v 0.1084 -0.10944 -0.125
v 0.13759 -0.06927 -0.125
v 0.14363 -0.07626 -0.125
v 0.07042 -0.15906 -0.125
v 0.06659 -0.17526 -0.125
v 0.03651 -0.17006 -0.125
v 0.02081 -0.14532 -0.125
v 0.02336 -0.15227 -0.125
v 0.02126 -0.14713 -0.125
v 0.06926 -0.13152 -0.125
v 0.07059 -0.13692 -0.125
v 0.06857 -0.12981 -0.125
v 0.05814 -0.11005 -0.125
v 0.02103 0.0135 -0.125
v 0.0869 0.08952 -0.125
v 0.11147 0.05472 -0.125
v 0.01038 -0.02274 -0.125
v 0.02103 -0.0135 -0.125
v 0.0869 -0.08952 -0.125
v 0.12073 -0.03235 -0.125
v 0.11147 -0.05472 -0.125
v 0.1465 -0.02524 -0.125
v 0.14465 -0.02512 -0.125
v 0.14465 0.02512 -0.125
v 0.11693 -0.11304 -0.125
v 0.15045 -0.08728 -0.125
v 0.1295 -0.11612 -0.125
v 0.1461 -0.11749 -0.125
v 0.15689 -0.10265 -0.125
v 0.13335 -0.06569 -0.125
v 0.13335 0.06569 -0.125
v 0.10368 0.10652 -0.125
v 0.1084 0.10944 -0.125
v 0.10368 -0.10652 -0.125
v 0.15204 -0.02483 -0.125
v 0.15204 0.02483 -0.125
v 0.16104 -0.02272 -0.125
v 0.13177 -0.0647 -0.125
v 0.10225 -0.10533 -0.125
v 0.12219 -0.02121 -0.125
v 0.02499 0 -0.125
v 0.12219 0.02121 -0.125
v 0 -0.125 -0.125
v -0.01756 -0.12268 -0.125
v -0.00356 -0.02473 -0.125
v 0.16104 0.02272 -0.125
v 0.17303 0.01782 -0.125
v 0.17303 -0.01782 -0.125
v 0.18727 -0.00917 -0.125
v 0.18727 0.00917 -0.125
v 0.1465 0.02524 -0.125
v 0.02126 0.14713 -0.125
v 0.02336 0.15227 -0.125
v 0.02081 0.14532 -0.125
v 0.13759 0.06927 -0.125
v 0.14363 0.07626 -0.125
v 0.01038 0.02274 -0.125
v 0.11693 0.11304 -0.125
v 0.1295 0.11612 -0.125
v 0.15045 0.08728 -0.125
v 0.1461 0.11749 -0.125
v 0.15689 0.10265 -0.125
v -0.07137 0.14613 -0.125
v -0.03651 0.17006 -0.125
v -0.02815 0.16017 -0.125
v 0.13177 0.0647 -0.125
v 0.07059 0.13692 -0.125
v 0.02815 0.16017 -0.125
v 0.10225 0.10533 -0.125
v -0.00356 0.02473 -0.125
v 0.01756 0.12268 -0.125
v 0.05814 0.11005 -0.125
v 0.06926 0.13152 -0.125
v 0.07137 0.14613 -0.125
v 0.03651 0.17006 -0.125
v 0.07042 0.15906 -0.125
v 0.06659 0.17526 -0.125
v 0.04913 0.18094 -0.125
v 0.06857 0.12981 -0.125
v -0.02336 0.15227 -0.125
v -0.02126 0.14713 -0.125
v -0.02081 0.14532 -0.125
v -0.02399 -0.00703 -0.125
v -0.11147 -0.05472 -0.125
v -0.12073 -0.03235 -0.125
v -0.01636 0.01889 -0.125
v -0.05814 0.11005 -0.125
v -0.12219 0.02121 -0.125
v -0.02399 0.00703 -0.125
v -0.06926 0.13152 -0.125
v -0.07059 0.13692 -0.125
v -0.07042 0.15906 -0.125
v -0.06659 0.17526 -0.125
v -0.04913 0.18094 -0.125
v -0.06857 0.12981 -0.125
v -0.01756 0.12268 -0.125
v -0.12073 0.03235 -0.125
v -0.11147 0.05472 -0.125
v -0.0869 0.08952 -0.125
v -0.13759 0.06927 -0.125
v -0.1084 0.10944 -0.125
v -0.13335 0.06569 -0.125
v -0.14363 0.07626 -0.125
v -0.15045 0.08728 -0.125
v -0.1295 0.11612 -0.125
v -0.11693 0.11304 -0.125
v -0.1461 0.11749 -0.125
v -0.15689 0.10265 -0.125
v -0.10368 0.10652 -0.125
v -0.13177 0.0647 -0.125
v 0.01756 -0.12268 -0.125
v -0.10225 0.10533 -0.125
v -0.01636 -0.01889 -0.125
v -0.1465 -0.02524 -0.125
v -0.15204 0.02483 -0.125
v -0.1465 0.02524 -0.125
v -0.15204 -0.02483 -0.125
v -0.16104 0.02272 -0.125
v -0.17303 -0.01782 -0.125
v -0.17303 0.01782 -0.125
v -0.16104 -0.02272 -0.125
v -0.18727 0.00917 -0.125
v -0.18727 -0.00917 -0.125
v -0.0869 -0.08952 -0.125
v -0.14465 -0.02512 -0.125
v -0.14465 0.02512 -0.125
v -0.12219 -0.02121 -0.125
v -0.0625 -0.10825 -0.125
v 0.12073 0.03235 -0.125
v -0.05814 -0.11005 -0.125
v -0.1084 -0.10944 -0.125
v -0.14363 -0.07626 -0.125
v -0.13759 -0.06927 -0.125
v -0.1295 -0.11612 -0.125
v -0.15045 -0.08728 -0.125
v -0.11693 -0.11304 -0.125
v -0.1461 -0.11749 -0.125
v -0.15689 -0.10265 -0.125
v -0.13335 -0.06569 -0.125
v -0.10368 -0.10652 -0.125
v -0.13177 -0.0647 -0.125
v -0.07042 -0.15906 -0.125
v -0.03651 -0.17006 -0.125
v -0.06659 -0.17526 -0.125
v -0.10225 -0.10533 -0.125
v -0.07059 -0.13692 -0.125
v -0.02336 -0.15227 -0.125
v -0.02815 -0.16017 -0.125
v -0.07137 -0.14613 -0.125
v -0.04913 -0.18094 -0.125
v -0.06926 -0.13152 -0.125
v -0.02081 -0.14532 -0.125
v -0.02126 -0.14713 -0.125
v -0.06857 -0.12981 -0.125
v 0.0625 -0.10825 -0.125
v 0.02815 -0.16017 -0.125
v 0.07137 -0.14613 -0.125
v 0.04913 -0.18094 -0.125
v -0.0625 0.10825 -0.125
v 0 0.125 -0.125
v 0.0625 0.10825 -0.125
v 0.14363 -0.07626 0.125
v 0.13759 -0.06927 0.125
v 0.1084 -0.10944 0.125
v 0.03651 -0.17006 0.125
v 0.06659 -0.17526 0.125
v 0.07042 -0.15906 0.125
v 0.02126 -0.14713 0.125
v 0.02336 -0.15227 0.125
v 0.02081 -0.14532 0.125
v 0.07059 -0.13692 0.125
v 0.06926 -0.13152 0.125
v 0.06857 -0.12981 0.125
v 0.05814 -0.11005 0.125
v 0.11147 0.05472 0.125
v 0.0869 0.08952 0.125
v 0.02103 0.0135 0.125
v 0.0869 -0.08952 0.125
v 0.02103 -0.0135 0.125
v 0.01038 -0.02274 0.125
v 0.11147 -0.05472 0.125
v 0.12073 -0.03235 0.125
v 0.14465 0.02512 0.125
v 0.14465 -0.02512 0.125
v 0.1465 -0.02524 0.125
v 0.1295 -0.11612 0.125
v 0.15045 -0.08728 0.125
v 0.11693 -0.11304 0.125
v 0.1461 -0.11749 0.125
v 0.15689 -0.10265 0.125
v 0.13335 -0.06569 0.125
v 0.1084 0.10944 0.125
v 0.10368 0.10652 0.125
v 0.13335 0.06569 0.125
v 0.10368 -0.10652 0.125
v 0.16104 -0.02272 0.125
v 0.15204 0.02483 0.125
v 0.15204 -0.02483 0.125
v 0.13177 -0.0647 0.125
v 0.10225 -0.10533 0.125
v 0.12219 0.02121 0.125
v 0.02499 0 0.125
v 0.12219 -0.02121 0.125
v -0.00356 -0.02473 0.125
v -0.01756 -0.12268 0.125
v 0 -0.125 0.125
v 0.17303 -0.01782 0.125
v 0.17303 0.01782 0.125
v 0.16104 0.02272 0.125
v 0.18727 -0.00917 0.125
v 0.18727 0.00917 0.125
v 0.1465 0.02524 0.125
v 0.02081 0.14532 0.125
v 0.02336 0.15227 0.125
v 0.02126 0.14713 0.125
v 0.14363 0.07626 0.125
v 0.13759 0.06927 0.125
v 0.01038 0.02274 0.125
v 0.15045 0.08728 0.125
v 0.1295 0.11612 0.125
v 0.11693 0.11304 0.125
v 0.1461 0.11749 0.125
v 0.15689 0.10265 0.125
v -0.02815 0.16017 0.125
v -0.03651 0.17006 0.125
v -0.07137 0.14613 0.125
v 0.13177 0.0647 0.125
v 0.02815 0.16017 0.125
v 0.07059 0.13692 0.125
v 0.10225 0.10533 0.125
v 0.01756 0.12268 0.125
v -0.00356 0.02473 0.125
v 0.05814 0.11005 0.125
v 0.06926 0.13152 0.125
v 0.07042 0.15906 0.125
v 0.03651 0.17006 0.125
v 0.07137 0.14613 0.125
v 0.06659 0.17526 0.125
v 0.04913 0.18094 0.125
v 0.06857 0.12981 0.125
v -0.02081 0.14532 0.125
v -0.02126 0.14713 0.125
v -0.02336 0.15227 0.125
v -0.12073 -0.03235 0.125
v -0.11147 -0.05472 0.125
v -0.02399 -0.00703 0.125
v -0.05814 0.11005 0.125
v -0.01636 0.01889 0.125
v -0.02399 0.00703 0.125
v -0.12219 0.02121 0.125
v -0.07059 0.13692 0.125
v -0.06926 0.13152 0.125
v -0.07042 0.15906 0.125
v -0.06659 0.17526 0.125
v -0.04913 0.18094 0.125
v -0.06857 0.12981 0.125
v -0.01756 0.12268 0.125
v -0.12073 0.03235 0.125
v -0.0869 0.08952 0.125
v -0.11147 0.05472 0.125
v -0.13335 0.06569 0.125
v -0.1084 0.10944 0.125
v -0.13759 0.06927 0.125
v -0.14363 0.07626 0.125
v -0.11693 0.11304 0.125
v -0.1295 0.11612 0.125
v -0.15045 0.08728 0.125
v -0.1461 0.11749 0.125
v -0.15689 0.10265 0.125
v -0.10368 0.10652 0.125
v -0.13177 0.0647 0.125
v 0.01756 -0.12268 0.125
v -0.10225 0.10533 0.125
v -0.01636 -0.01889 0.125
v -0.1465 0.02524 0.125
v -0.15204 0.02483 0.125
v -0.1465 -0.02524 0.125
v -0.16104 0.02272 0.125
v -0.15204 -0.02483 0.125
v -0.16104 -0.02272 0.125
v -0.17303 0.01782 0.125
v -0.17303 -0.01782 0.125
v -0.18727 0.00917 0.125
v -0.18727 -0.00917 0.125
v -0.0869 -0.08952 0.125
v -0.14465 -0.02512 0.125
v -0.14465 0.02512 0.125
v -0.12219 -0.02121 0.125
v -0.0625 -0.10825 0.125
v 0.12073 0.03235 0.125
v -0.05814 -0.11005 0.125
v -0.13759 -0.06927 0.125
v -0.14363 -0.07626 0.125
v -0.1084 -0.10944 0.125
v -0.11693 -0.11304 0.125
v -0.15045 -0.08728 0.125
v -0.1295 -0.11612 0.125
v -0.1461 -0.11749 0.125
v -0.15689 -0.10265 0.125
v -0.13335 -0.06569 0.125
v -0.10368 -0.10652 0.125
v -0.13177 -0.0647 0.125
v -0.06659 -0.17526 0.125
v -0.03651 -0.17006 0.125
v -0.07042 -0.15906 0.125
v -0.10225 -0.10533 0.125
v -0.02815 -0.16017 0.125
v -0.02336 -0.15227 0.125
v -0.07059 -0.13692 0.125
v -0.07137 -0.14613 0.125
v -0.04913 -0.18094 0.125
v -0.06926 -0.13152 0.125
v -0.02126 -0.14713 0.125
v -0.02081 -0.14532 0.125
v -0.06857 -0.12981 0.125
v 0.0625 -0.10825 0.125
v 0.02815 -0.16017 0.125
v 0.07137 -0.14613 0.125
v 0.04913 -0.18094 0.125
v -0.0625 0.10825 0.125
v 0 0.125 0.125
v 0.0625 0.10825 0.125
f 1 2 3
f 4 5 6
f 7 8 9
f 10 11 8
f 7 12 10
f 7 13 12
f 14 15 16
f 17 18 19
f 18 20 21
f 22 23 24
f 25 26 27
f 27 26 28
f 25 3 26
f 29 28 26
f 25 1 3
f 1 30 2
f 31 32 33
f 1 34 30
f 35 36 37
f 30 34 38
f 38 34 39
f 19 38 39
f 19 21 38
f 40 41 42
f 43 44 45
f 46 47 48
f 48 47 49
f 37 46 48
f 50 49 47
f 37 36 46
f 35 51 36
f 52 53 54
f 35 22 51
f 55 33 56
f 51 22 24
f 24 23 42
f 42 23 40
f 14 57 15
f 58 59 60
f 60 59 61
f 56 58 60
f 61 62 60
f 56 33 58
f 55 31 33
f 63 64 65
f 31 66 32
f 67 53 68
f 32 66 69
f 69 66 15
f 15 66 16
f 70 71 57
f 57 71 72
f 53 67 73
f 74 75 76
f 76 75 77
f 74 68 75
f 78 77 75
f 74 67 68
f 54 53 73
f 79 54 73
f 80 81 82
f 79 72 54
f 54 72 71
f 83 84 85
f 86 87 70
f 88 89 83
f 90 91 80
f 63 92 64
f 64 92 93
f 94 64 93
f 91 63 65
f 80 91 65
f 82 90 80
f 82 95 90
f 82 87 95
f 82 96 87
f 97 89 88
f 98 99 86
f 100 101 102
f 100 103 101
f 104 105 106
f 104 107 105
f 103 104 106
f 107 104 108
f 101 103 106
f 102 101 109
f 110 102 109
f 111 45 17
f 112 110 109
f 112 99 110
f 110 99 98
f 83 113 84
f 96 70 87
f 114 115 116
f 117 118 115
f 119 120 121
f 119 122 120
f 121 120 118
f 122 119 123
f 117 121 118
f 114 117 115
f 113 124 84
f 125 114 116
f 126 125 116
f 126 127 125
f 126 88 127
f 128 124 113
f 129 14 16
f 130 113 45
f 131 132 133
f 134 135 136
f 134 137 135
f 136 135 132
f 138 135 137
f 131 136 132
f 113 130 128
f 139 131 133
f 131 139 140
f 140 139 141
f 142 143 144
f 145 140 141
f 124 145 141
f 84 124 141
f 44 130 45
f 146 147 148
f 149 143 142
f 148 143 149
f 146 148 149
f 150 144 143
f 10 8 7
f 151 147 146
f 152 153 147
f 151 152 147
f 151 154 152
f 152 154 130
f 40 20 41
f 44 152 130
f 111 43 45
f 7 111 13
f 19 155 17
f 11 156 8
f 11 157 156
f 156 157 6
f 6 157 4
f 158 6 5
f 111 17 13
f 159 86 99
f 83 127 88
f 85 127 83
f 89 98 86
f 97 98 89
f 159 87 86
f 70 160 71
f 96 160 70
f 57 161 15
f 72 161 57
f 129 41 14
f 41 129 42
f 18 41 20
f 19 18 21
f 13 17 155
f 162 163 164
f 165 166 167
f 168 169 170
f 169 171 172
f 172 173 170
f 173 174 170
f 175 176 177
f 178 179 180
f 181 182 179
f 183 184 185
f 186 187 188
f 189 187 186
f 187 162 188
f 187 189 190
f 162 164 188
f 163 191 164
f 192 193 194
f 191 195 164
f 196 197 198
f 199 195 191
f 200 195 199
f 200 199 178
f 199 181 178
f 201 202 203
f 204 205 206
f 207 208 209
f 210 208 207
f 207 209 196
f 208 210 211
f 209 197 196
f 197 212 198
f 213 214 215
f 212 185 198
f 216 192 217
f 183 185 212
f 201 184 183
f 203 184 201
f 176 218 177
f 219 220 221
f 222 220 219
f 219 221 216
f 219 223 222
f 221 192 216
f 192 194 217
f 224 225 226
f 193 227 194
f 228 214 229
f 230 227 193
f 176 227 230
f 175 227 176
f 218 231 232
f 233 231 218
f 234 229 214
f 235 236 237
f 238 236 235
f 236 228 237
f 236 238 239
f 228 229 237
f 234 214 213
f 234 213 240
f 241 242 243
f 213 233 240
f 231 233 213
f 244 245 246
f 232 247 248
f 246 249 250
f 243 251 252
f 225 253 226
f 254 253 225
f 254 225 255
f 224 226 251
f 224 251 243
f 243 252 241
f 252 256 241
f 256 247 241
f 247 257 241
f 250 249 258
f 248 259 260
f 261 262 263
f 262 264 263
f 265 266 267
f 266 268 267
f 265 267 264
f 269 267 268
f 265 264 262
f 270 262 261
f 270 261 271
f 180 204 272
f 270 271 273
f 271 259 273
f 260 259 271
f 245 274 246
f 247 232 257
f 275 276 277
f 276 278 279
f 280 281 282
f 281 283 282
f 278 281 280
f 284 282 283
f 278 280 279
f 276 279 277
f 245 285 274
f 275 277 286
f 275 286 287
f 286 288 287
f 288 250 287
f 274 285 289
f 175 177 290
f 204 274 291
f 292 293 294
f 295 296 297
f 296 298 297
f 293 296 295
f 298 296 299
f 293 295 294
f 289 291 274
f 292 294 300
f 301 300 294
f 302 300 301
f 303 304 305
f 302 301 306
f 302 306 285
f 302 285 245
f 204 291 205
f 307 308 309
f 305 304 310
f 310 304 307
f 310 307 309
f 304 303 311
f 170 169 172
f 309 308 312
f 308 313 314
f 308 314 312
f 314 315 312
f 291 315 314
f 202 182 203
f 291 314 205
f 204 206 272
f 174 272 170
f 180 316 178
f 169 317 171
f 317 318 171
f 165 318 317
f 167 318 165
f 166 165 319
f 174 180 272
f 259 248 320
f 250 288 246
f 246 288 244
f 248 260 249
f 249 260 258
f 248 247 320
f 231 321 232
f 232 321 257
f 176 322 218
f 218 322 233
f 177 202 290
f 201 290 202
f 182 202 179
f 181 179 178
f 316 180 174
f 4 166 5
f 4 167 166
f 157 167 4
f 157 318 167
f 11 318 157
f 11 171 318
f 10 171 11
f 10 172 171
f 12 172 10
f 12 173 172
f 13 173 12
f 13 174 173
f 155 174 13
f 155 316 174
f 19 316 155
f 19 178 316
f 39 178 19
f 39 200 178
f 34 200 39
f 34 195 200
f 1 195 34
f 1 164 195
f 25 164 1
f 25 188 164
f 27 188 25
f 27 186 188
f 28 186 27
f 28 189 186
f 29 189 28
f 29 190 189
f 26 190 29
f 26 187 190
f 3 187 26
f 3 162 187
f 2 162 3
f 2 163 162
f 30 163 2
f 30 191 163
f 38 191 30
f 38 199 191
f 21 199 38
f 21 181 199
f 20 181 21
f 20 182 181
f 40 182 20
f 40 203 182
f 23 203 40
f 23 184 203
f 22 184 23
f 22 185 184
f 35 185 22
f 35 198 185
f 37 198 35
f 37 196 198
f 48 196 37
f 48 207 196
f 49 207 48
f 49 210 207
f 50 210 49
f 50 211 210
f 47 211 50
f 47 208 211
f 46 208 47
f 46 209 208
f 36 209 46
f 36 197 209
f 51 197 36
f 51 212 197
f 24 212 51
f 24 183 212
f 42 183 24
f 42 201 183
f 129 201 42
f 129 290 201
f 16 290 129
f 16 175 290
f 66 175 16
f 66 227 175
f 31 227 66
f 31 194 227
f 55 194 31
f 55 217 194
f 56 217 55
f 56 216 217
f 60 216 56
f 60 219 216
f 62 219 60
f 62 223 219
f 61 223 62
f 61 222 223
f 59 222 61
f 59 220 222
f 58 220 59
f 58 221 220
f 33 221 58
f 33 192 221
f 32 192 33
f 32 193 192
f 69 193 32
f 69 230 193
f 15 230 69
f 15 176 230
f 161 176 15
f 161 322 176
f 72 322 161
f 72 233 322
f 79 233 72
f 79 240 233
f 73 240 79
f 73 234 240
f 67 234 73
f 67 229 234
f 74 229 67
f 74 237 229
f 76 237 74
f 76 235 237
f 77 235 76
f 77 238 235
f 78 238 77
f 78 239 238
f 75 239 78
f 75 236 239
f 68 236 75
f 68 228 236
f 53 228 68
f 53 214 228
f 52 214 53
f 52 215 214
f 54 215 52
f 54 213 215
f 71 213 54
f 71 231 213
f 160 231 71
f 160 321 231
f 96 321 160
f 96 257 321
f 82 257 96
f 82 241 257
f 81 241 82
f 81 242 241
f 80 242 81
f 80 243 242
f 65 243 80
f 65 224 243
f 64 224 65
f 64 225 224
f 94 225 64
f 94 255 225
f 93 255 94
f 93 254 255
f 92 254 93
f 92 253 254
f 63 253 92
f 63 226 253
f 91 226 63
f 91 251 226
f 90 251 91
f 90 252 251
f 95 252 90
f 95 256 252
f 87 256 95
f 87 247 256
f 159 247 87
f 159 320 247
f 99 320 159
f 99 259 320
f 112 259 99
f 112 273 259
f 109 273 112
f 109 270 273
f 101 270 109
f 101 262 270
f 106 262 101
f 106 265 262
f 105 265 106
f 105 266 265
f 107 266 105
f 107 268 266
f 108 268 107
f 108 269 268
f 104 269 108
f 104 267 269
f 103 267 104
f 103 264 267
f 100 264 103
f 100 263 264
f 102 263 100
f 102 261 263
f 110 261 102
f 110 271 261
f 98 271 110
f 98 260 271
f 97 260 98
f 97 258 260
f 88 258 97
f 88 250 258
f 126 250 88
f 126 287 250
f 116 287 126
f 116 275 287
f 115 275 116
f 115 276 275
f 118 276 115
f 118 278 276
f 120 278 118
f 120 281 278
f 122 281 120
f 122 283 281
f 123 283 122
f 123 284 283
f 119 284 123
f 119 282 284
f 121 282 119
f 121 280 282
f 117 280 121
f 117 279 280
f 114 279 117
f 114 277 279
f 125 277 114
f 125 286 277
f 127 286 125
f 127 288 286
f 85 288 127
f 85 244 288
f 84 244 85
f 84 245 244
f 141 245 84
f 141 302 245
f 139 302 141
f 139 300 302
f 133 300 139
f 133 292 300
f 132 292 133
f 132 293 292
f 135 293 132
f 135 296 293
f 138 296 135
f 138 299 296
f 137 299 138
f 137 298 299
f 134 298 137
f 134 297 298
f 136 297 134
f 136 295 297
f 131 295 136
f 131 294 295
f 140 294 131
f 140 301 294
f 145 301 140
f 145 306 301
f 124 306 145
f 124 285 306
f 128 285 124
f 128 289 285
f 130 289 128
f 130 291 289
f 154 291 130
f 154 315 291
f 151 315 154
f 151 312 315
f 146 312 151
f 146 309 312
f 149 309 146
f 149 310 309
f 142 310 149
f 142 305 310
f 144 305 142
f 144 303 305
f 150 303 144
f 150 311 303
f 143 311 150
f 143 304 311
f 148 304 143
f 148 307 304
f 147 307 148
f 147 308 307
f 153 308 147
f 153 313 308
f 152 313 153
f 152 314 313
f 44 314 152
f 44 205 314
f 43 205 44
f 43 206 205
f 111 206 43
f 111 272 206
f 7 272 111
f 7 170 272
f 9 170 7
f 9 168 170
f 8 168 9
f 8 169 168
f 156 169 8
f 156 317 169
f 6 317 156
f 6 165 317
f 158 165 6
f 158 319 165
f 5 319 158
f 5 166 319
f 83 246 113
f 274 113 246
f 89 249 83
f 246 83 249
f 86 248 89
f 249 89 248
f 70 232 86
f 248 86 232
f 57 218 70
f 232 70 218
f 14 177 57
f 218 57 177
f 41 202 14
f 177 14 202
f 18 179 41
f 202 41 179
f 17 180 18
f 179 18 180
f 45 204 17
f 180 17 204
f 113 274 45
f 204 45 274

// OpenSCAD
// file: gears.scad
//------------------------------------------------------------------
/*

Involute Gears

*/
//------------------------------------------------------------------
// control the number of facets on cylinders

_accuracy = 0.001;
function facets(r) = 180 / acos(1 - (_accuracy / r));

//------------------------------------------------------------------

epsilon = 0.001;

//------------------------------------------------------------------

pi = 3.1415926535;

// degrees to radians
function d2r(d) = (d * pi) / 180;

// radians to degrees
function r2d(r) = (180 * r) / pi;

// return the involute coordinate
// r = base radius
// theta = involute angle (degrees)
function involute(r, theta) = [
  r * (cos(theta) + d2r(theta) * sin(theta)),
  r * (sin(theta) - d2r(theta) * cos(theta))
];

// return the involute angle (degrees)
// r = base radius
// d = involute radial distance
function involute_angle(r, d) = r2d(sqrt(pow(d / r, 2) - 1));

// mirror across the x-axis
function mirror_x(p) = [p[0], -p[1]];

// rotate point p by theta (degrees)
function rotate_point(p, theta) = [
  cos(theta) * p[0] - sin(theta) * p[1],
  sin(theta) * p[0] + cos(theta) * p[1]
];

//------------------------------------------------------------------

module involute_gear_tooth (
  number_teeth,
  pitch_radius,
  root_radius,
  base_radius,
  outer_radius,
  backlash,
  involute_facets
) {

  // work out the angular extent of the tooth on the base radius
  pitch_point = involute(base_radius, involute_angle(base_radius, pitch_radius));
  face_angle = atan2(pitch_point[1], pitch_point[0]);
  backlash_angle = r2d(backlash / pitch_radius) / 2;
  center_angle = (90 / number_teeth) + face_angle - backlash_angle;

  // work out the angles over which the involute will be used
  start_angle = involute_angle(base_radius, max(base_radius, root_radius));
  stop_angle = involute_angle(base_radius, outer_radius);
  dtheta = (stop_angle - start_angle) / involute_facets;
  angles = [for (i=[0:involute_facets]) start_angle + (i * dtheta)];

  // work out the polygon points
  t_lower = [for (a=angles) rotate_point(involute(base_radius, a), -center_angle)];
  t_upper = [for (p=t_lower) mirror_x(p)];
  t_points = concat([[0,0]], t_lower, t_upper);

  // work out the polygon paths
  p_lower = [for (i=[0 : 1 : involute_facets + 1]) i];
  p_upper = [for (i=[2 * involute_facets + 2 : -1 : involute_facets + 2]) i];
  t_path = concat(p_lower, p_upper);

  polygon(points=t_points, paths = [t_path], convexity = 2);
}

//------------------------------------------------------------------
// generate a 2D involute gear
// number_teeth = number of teeth
// pitch_diameter = diameter of pitch circle
// pressure_angle = pressure angle (degrees)
// backlash = backlash expressed as units of pitch circumference
// clearance = additional root clearance
// ring_width = width of ring wall (from root circle)
// involute_facets = number of facets for involute flank

module involute_gear(
  number_teeth,
  pitch_diameter,
  pressure_angle,
  backlash,
  clearance,
  ring_width,
  involute_facets
) {

  pitch_radius = pitch_diameter / 2;

  // base circle radius
  base_radius = pitch_radius * cos(pressure_angle);

  // addendum: radial distance from pitch circle to outside circle
  addendum = pitch_diameter / number_teeth;
  // dedendum: radial distance from pitch circle to root circle
  dedendum = addendum + clearance;

  outer_radius = pitch_radius + addendum;
  root_radius = pitch_radius - dedendum;
  ring_radius = root_radius - ring_width;

  difference() {
    union() {
      for (i = [1:number_teeth]) {
        rotate([0,0,i * (360 / number_teeth)]) {
           involute_gear_tooth (
             number_teeth,
             pitch_radius,
             root_radius,
             base_radius,
             outer_radius,
             backlash,
             involute_facets
           );
        }
      }
      circle(r = root_radius, $fn = facets(root_radius));
    }
    circle(r = ring_radius, $fn = facets(ring_radius));
  }
}

//------------------------------------------------------------------

module spur_gear(
  number_teeth = 20,
  pitch_diameter = 2,
  pressure_angle = 20,
  backlash = 0,
  clearance = 0,
  ring_width = 0.2,
  involute_facets = 5,
  height = 1
) {
  linear_extrude(height = height) {
    involute_gear(
      number_teeth = number_teeth,
      pitch_diameter = pitch_diameter,
      pressure_angle = pressure_angle,
      backlash = backlash,
      clearance = clearance,
      ring_width = ring_width,
      involute_facets = involute_facets
    );
  }
}

//------------------------------------------------------------------

module helical_gear(
  number_teeth,
  pitch_diameter,
  pressure_angle,
  backlash,
  clearance,
  ring_width,
  involute_facets,
  height,
  helix_angle
) {

  twist_angle = r2d(2 * height * tan(helix_angle) / pitch_diameter);

  linear_extrude(height = height, twist = twist_angle) {
    involute_gear(
      number_teeth = number_teeth,
      pitch_diameter = pitch_diameter,
      pressure_angle = pressure_angle,
      backlash = backlash,
      clearance = clearance,
      ring_width = ring_width,
      involute_facets = involute_facets
    );
  }
}

//------------------------------------------------------------------

module test_involute_gear_tooth() {
  involute_gear_tooth (
    number_teeth = 10,
    pitch_radius = 0.15625,
    root_radius = 0.125,
    base_radius = 0.146827,
    outer_radius = 0.1875,
    backlash = 0,
    involute_facets = 10
  );
}

module test_involute_gear() {
  involute_gear(
    number_teeth = 32,
    pitch_diameter = 50,
    pressure_angle = 20,
    backlash = 0,
    clearance = 0,
    ring_width = 5,
    involute_facets = 10
  );
}

module test_spur_gear() {
  spur_gear(
    number_teeth = 20,
    pitch_diameter = 2,
    pressure_angle = 20,
    backlash = 0,
    clearance = 0,
    ring_width = 0.2,
    involute_facets = 5,
    height = 0.25
  );
}

module test_helical_gear() {
  helical_gear(
    number_teeth = 32,
    pitch_diameter = 4,
    pressure_angle = 20,
    backlash = 0,
    clearance = 0,
    ring_width = 0.2,
    involute_facets = 5,
    height = 1,
    helix_angle = 15
  );
}

//------------------------------------------------------------------

//test_involute_gear_tooth();
//test_involute_gear();
//test_spur_gear();
test_helical_gear();

//------------------------------------------------------------------
// main file
//------------------------------------------------------------------



//------------------------------------------------------------------

use <gears.scad>;

//------------------------------------------------------------------

module oil_pump_wheel() {

  gear_width = 1/4;

  difference() {

    union() {
      translate([0,0,-gear_width/2]) {
        spur_gear(
          number_teeth = 40,
          pitch_diameter = 5/4,
          pressure_angle = 20,
          backlash = 0,
          clearance = 0,
          ring_width = 3/32,
          involute_facets = 5,
          height = gear_width
        );
      }
      cylinder(
        h = gear_width/2,
        r = 1/2,
        $fn = facets(1/2),
        center = true
      );
      cylinder(
        h = 3/4,
        r = 1/4,
        $fn = facets(1/4),
        center = true
      );
    }

    union() {
      for(i = [0:5]) {
        rotate([0,0,i * 60]) {
          translate([3/8,0,0]) {
            cylinder(
              h = 1,
              r = 1/8,
              $fn = facets(1/8),
              center = true
            );
          }
        }
      }
    }
  }
}

//------------------------------------------------------------------

module oil_pump_pinion() {

  gear_width = 1/4;
  translate([0,0,-gear_width/2]) {
    spur_gear(
      number_teeth = 10,
      pitch_diameter = 5/16,
      pressure_angle = 20,
      backlash = 0,
      clearance = 0,
      ring_width = 0.1,
      involute_facets = 5,
      height = gear_width
    );
  }
}

//------------------------------------------------------------------


module wallaby_gears() {

//  oil_pump_wheel();
  oil_pump_pinion();

/*
  translate([3,0,0]) {
    spur_gear(
      number_teeth = 20,
      pitch_diameter = 5/8,
      pressure_angle = 20,
      backlash = 0,
      clearance = 0,
      ring_width = 0.125,
      involute_facets = 5,
      height = 0.25
    );
  }



  }*/



}

wallaby_gears();


//------------------------------------------------------------------
